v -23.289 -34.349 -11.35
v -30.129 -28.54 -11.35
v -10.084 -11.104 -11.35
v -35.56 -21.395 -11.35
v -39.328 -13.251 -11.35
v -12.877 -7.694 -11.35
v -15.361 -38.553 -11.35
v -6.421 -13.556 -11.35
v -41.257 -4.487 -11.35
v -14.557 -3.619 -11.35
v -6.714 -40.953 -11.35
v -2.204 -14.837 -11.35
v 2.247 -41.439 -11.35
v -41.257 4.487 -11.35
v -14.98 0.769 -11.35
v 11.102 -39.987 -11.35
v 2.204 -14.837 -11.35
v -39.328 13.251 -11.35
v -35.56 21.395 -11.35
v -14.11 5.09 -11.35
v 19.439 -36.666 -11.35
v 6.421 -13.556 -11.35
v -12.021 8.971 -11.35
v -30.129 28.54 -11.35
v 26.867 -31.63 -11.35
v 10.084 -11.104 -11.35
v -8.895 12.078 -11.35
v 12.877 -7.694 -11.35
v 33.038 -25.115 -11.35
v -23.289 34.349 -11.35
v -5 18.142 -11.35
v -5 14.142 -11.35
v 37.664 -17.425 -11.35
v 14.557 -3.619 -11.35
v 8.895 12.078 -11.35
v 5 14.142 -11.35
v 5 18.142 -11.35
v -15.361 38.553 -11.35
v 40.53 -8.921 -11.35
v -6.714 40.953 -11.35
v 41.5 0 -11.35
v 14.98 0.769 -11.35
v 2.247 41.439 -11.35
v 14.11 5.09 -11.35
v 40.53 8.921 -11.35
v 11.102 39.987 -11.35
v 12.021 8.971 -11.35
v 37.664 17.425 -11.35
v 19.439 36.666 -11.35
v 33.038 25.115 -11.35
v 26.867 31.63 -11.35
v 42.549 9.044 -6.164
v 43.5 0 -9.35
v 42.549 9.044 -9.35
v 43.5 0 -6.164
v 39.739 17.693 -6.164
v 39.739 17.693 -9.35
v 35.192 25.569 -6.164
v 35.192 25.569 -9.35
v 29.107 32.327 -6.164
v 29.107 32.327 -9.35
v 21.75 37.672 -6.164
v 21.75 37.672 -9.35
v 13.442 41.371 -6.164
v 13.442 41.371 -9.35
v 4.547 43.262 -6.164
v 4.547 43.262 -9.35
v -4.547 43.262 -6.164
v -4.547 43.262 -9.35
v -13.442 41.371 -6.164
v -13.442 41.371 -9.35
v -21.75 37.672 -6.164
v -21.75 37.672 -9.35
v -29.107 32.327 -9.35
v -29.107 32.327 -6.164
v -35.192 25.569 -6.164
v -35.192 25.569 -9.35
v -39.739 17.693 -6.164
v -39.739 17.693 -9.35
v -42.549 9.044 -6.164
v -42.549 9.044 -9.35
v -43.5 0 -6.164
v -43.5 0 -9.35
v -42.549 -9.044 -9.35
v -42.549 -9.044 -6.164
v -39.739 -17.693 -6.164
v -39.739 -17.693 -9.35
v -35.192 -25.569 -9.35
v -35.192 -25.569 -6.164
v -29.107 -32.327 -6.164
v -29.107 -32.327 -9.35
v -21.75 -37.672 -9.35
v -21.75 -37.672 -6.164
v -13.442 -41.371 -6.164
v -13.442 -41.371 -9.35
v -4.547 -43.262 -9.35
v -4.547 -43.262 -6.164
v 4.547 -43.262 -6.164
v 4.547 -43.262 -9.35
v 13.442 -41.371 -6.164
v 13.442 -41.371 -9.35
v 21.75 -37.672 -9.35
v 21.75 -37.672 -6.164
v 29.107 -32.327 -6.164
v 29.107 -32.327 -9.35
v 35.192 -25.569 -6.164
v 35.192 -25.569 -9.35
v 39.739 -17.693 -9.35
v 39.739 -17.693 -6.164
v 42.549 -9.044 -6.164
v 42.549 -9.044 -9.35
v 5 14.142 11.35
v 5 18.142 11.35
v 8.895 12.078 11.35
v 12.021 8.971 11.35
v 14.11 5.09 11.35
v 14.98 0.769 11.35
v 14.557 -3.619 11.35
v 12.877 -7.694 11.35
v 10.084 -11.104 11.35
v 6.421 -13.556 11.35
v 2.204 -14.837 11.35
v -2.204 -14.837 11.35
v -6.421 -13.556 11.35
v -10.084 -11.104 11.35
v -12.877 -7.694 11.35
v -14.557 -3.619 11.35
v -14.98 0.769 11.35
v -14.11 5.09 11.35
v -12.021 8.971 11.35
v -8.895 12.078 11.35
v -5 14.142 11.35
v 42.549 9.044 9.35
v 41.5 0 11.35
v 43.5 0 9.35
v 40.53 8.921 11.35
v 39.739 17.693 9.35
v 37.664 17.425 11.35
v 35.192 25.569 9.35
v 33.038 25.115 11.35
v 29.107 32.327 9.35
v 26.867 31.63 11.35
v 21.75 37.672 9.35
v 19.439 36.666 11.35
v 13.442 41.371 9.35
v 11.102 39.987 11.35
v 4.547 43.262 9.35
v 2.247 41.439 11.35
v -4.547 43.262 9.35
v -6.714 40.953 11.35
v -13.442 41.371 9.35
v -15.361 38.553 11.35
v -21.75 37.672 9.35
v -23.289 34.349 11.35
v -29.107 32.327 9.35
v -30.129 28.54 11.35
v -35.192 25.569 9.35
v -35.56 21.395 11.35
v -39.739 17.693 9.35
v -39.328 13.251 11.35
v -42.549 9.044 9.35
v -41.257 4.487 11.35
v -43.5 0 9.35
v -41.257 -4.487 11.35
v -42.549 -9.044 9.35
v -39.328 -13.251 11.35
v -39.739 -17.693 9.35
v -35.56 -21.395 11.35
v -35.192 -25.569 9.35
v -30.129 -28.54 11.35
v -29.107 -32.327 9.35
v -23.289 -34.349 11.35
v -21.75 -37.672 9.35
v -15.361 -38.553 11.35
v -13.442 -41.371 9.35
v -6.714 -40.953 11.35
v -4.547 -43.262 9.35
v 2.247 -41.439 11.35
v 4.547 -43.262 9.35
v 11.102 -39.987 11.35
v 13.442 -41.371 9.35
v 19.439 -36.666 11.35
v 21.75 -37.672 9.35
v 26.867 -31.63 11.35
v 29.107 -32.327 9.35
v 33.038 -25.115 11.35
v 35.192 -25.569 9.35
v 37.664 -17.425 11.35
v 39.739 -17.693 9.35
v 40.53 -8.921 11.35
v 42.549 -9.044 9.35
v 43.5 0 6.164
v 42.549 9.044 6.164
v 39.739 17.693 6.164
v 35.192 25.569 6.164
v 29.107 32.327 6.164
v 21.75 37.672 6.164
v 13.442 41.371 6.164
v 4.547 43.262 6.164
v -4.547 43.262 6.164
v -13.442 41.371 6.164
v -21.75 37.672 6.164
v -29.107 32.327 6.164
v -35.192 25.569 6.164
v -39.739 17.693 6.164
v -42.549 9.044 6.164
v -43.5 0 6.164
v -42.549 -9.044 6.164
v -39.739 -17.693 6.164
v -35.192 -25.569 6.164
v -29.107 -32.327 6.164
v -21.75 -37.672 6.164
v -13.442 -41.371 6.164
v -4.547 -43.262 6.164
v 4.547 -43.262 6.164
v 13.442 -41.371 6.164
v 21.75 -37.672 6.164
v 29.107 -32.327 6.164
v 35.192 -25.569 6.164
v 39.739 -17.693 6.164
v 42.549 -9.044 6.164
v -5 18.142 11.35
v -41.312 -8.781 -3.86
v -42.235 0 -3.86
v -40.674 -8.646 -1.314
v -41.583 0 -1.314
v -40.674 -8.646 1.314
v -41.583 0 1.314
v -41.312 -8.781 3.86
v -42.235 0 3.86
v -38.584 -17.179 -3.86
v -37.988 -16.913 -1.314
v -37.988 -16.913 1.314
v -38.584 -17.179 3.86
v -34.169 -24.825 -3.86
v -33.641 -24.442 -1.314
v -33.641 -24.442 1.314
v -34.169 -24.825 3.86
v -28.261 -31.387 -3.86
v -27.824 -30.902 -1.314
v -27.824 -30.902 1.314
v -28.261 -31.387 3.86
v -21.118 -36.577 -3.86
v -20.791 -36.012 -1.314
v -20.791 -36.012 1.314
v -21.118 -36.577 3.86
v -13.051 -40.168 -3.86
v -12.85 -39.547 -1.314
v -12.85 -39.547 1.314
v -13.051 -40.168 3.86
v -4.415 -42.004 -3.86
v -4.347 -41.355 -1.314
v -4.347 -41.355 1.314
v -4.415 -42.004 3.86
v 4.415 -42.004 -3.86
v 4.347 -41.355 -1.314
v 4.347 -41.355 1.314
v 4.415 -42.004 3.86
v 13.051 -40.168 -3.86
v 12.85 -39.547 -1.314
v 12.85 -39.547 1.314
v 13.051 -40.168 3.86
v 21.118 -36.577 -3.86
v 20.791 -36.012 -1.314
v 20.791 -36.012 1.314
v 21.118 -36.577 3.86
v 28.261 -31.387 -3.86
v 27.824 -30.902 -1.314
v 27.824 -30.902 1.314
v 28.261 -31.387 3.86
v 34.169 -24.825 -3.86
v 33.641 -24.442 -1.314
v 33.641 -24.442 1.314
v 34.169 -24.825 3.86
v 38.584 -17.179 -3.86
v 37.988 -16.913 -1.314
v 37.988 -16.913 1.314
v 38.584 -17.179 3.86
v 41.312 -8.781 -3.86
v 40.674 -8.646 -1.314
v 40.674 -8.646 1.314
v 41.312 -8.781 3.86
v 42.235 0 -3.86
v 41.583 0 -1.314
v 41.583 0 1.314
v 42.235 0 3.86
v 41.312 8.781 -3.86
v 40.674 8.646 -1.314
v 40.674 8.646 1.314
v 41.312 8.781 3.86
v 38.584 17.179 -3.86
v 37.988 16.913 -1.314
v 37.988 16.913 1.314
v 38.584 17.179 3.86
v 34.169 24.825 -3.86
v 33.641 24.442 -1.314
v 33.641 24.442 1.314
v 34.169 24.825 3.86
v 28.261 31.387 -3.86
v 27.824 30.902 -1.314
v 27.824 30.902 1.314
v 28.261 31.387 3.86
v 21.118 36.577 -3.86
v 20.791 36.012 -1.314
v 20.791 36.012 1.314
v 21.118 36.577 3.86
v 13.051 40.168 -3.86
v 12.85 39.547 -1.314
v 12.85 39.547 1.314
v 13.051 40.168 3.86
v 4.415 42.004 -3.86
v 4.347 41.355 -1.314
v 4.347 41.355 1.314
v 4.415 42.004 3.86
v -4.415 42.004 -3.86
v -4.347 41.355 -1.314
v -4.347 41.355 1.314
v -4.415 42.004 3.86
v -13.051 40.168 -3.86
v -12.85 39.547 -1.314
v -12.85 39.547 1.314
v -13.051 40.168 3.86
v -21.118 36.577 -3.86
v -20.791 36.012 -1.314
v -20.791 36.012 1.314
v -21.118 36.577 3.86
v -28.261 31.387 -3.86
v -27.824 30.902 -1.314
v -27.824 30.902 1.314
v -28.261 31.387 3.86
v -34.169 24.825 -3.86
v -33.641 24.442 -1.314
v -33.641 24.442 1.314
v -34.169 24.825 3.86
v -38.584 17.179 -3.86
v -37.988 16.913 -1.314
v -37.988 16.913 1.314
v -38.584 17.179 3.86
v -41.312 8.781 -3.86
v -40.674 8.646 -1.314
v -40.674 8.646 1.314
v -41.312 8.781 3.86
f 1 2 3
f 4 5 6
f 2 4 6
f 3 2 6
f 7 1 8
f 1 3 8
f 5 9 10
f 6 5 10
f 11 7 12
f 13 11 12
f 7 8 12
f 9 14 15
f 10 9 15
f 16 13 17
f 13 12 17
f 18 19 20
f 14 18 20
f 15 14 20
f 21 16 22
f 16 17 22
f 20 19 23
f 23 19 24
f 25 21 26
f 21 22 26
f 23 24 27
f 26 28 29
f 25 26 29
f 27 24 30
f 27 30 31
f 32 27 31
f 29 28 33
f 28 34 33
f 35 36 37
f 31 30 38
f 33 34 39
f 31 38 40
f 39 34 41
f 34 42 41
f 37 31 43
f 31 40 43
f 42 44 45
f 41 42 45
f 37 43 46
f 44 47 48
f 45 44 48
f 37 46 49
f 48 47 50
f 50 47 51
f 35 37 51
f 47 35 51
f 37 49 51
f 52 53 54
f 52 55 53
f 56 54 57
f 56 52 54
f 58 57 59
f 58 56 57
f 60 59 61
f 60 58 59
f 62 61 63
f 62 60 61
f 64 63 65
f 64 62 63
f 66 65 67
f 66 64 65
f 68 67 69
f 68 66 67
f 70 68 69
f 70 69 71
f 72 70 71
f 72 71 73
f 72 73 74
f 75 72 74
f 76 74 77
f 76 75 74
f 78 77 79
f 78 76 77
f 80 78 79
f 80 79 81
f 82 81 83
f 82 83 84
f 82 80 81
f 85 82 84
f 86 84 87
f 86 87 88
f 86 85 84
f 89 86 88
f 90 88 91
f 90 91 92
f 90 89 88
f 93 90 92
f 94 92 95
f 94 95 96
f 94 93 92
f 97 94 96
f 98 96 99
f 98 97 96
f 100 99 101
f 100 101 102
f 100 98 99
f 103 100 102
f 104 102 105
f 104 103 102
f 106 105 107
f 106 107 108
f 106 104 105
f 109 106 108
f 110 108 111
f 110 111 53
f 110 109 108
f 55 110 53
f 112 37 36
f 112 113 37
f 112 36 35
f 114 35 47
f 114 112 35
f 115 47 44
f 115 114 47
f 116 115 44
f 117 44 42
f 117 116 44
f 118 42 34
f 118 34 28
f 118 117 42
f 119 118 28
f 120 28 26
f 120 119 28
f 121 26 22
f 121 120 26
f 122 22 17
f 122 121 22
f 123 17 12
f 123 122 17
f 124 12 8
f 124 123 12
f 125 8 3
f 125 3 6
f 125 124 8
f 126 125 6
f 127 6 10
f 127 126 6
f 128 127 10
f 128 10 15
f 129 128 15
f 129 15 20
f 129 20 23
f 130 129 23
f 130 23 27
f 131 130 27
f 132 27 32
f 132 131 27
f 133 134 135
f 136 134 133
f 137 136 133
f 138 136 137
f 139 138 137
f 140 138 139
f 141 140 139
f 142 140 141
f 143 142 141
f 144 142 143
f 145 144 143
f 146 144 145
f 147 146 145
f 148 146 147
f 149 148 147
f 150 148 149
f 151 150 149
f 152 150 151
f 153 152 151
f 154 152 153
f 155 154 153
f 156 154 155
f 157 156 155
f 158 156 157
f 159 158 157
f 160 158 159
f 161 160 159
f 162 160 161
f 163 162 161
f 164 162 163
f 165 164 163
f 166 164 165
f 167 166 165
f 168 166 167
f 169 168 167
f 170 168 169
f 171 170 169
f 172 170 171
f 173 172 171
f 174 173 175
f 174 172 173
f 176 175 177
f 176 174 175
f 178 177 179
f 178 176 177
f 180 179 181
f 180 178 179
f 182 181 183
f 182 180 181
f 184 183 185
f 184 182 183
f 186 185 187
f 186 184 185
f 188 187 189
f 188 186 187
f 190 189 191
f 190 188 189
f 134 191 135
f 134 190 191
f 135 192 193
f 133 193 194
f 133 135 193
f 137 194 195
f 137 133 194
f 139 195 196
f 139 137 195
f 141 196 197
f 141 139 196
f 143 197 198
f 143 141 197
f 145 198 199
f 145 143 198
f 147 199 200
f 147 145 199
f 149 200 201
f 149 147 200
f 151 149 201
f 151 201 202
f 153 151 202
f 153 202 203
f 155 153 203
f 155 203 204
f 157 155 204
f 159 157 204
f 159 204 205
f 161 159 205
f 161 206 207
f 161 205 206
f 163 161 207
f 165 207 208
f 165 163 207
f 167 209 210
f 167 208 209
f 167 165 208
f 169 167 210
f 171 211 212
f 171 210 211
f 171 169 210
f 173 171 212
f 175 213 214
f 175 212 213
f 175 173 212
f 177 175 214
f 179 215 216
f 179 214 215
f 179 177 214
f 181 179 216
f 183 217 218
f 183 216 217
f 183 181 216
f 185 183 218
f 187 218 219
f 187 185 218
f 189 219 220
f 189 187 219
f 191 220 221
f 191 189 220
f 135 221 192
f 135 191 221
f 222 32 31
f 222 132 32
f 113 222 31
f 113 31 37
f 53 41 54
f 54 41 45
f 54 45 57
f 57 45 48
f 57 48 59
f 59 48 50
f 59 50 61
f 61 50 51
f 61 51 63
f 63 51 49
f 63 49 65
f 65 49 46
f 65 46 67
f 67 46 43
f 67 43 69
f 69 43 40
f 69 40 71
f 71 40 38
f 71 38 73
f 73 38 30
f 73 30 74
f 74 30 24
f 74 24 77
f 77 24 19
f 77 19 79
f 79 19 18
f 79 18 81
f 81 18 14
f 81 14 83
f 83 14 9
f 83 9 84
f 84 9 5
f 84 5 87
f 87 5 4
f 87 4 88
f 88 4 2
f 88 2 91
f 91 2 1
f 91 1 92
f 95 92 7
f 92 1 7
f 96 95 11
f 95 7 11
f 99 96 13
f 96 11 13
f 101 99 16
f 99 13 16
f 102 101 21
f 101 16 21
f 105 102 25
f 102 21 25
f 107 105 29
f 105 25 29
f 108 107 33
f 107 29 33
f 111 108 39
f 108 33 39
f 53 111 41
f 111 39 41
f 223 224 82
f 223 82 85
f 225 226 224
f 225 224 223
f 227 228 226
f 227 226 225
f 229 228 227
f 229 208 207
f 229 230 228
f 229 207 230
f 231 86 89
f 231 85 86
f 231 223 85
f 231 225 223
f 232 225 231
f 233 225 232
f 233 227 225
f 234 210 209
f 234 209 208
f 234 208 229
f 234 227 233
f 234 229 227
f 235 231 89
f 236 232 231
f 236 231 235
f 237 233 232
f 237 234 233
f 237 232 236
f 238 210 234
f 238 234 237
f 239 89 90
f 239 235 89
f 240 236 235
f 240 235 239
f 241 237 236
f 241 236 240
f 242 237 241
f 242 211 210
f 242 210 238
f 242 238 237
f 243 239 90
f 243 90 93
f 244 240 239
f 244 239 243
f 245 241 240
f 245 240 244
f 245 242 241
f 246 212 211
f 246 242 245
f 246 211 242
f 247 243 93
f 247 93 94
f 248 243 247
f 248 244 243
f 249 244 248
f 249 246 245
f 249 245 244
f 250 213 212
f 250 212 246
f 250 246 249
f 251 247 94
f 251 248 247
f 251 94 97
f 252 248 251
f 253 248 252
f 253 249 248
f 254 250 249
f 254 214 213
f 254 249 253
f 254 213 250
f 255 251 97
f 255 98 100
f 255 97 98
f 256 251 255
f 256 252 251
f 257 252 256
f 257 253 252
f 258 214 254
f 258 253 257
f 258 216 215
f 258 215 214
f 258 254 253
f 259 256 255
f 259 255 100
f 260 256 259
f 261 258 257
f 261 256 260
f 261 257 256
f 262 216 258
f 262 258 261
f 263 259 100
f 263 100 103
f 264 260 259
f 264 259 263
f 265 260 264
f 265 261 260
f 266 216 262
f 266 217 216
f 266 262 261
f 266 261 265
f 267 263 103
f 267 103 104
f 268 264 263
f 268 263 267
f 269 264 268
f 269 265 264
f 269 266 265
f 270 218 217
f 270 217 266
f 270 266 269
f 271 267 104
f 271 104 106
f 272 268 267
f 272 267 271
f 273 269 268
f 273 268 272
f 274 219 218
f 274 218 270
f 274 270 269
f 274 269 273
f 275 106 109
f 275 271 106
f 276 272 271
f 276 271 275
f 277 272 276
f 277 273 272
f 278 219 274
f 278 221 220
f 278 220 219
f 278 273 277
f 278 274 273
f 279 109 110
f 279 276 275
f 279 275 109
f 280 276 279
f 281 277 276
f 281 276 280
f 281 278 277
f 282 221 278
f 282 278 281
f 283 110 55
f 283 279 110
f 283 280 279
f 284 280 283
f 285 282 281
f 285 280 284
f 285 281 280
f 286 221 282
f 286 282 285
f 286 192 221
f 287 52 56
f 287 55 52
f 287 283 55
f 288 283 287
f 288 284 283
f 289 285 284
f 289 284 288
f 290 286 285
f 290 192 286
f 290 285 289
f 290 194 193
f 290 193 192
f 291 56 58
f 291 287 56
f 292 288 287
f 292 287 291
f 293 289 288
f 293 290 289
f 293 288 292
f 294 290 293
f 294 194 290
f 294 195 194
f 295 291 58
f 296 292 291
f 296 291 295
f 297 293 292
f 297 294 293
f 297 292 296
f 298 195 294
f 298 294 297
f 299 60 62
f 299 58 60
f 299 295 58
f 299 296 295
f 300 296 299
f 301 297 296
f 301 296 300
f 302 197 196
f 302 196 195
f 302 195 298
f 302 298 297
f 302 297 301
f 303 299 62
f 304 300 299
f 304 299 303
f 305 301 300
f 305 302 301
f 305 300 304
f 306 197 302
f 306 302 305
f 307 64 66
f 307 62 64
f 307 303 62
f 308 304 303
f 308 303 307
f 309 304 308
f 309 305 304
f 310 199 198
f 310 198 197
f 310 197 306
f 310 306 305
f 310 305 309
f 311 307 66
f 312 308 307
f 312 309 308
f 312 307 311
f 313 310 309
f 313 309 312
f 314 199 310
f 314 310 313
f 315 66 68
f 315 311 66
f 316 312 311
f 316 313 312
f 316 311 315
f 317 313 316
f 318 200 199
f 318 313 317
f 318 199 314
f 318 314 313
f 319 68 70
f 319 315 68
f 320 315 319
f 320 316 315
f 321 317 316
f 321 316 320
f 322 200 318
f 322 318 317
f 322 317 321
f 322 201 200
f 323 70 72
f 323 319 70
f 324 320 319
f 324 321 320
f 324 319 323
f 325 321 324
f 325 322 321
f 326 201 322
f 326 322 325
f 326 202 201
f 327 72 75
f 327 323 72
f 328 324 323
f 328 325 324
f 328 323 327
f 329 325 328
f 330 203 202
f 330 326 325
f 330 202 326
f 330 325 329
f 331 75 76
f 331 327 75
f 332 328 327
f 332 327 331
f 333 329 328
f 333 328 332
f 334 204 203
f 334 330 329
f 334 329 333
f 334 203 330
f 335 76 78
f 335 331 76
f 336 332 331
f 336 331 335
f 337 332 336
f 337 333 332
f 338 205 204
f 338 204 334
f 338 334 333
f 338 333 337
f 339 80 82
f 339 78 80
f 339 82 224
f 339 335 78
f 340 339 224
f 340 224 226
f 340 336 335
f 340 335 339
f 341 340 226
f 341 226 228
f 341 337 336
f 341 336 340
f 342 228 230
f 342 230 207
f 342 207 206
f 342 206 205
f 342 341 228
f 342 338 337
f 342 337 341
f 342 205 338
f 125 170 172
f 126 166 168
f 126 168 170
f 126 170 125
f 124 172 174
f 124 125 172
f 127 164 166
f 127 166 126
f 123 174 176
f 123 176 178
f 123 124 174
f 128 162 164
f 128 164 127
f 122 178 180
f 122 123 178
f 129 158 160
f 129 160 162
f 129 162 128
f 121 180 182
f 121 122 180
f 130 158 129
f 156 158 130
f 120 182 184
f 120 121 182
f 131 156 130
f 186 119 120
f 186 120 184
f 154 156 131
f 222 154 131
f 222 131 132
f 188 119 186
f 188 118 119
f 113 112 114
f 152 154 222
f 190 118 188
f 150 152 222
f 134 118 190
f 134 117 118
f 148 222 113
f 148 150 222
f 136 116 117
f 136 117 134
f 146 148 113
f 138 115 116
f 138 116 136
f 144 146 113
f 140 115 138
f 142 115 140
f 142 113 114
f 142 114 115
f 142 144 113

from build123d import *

# Parameters (mm, degrees)
SKETCH1_R           = 43.5
BOSS_EXTRUDE1_DEPTH = 11.35
CHAMFER1_SIZE       = 2
SKETCH2_R           = 10.5


with BuildPart() as part:
    # Sketch1 → Boss-Extrude1 (new, symmetric)
    with BuildSketch(Plane.XY):
        Circle(SKETCH1_R)
        with BuildLine():
            Line((-5, 18.142135624), (5, 18.142135624))
            Line((5, 18.142135624), (5, 14.142135624))
            ThreePointArc((5, 14.142135624), (0, -15), (-5, 14.142135624))
            Line((-5, 14.142135624), (-5, 18.142135624))
        make_face(mode=Mode.SUBTRACT)
    extrude(amount=BOSS_EXTRUDE1_DEPTH, both=True)

    # Chamfer1
    chamfer1_edges = [part.edges().sort_by_distance(p)[0] for p in [
        (-43.5, 0, -11.35),
        (-43.5, 0, 11.35),
    ]]
    chamfer(chamfer1_edges, length=CHAMFER1_SIZE)

    # Sketch2 → Cut-Revolve1 (revolve, cut)
    with BuildSketch(Plane(origin=(0, 0, 0), x_dir=(0, 0, -1), z_dir=(1, 0, 0)), mode=Mode.PRIVATE) as cut_revolve1_sk:
        with Locations((0, -52)):
            Circle(SKETCH2_R)
    revolve(cut_revolve1_sk.sketch.rotate(Axis((0, 0, -83.533331893), (0, 0, 1)), 270), axis=Axis((0, 0, -83.533331893), (0, 0, 1)), mode=Mode.SUBTRACT)


solid = part.part
